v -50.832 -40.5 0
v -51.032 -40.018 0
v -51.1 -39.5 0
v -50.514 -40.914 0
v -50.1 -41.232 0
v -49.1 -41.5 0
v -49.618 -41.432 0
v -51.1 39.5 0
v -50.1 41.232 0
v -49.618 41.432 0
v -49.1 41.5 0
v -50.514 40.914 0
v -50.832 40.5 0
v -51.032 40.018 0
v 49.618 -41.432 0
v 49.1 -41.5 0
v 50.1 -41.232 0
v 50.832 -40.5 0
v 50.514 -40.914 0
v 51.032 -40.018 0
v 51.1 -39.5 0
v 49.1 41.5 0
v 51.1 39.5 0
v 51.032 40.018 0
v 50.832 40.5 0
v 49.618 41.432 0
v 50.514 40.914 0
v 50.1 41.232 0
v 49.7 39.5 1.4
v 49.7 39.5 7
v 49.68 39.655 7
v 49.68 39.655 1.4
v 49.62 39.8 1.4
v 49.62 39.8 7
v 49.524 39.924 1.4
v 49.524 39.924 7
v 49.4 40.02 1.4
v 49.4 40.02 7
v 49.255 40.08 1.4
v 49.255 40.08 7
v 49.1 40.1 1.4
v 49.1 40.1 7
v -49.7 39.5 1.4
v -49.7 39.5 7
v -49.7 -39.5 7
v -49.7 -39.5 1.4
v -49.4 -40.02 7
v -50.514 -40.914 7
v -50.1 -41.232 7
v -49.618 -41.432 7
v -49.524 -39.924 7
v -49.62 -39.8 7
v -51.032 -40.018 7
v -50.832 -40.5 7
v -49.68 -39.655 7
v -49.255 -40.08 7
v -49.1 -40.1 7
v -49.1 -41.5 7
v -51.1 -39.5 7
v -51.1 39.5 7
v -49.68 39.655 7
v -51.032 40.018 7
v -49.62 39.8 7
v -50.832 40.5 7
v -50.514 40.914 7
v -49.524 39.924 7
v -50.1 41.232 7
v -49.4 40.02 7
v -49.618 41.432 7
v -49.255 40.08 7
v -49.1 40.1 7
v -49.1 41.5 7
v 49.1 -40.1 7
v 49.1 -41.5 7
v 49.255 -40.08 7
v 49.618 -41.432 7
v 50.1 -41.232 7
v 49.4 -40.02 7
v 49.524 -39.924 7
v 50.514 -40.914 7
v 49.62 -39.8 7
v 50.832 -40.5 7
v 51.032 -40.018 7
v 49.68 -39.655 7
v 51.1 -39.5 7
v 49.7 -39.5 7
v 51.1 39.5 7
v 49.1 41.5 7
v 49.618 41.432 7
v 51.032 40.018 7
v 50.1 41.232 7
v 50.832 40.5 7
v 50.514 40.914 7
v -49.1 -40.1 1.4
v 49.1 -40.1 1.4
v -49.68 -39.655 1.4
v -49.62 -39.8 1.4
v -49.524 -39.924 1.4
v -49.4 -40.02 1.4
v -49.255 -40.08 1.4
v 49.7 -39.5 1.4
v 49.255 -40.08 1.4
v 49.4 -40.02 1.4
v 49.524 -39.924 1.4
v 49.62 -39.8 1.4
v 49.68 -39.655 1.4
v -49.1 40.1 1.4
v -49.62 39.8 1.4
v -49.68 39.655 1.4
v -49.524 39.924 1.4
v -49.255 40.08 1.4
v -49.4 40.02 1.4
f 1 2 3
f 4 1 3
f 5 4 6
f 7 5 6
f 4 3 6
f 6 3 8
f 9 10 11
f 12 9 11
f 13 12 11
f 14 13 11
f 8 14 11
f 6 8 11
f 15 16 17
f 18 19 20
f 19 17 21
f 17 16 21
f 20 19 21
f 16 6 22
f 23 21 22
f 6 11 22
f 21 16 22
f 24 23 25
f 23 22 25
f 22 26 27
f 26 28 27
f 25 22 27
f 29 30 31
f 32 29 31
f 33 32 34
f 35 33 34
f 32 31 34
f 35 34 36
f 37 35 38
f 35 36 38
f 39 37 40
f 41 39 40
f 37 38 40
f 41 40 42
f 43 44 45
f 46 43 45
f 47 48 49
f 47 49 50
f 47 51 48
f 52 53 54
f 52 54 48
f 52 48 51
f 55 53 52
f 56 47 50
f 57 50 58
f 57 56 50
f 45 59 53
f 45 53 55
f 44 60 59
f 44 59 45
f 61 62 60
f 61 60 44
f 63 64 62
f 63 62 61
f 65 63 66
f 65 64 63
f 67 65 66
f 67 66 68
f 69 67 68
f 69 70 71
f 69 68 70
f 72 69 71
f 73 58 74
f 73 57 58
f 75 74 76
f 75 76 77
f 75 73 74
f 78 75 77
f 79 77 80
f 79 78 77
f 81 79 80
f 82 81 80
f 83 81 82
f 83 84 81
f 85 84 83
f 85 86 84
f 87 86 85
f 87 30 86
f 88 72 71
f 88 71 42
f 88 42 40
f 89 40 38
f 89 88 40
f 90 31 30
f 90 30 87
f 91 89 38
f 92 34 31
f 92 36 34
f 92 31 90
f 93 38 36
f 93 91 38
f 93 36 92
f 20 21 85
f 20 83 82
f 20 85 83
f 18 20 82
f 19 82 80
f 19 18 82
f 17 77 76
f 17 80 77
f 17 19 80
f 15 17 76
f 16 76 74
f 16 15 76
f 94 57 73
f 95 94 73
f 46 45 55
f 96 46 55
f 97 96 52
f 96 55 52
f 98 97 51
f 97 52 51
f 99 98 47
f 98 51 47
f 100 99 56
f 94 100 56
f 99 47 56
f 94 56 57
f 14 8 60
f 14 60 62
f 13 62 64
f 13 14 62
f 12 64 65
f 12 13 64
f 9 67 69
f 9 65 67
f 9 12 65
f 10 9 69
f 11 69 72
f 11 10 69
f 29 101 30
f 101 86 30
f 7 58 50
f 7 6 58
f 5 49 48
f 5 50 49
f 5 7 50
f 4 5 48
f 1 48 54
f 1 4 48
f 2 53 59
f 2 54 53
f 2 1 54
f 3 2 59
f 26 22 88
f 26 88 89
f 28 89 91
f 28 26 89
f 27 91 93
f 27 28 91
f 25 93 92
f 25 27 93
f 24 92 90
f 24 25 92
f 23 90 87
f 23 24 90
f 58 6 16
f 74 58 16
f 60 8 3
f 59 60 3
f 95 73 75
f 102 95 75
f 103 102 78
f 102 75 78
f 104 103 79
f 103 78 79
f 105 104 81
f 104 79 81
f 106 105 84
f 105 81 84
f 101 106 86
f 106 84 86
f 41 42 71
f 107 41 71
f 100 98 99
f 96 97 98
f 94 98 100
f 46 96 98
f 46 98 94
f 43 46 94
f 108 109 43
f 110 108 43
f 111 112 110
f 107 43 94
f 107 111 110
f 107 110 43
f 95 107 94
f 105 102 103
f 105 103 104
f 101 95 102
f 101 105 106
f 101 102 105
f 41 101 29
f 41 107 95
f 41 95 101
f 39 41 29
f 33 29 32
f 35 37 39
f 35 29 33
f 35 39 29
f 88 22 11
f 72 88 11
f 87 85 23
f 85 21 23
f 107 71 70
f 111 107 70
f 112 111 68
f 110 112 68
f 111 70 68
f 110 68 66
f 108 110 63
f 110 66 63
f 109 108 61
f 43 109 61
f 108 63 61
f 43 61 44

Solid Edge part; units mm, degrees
sketch "Sketch1" plane through (0, 0, 0) normal (0, 0, 1) x (1, 0, 0)
  arc A0 (-49.1, 41.5) -> (-51.1, 39.5) centre (-49.1, 39.5) ccw
  line L0 (-51.1, 39.5) -> (-51.1, -39.5)
  arc A1 (-51.1, -39.5) -> (-49.1, -41.5) centre (-49.1, -39.5) ccw
  line L1 (-49.1, -41.5) -> (49.1, -41.5)
  arc A2 (49.1, -41.5) -> (51.1, -39.5) centre (49.1, -39.5) ccw
  line L2 (51.1, -39.5) -> (51.1, 39.5)
  arc A3 (49.1, 41.5) -> (51.1, 39.5) centre (49.1, 39.5) cw
  line L3 (49.1, 41.5) -> (-49.1, 41.5)
extrude "ExtrudedProtrusion_1" add sketch "Sketch1" along normal blind 7
sketch "Sketch2" plane through (0, 0, 7) normal (0, 0, 1) x (0, -1, 0)
  arc A0 (39.5, -49.7) -> (40.1, -49.1) centre (39.5, -49.1) ccw
  line L0 (40.1, -49.1) -> (40.1, 49.1)
  arc A1 (40.1, 49.1) -> (39.5, 49.7) centre (39.5, 49.1) ccw
  line L1 (39.5, 49.7) -> (-39.5, 49.7)
  arc A2 (-39.5, 49.7) -> (-40.1, 49.1) centre (-39.5, 49.1) ccw
  line L2 (-40.1, 49.1) -> (-40.1, -49.1)
  arc A3 (-40.1, -49.1) -> (-39.5, -49.7) centre (-39.5, -49.1) ccw
  line L3 (-39.5, -49.7) -> (39.5, -49.7)
extrude "ExtrudedCutout_1" cut sketch "Sketch2" against normal blind 5.6
